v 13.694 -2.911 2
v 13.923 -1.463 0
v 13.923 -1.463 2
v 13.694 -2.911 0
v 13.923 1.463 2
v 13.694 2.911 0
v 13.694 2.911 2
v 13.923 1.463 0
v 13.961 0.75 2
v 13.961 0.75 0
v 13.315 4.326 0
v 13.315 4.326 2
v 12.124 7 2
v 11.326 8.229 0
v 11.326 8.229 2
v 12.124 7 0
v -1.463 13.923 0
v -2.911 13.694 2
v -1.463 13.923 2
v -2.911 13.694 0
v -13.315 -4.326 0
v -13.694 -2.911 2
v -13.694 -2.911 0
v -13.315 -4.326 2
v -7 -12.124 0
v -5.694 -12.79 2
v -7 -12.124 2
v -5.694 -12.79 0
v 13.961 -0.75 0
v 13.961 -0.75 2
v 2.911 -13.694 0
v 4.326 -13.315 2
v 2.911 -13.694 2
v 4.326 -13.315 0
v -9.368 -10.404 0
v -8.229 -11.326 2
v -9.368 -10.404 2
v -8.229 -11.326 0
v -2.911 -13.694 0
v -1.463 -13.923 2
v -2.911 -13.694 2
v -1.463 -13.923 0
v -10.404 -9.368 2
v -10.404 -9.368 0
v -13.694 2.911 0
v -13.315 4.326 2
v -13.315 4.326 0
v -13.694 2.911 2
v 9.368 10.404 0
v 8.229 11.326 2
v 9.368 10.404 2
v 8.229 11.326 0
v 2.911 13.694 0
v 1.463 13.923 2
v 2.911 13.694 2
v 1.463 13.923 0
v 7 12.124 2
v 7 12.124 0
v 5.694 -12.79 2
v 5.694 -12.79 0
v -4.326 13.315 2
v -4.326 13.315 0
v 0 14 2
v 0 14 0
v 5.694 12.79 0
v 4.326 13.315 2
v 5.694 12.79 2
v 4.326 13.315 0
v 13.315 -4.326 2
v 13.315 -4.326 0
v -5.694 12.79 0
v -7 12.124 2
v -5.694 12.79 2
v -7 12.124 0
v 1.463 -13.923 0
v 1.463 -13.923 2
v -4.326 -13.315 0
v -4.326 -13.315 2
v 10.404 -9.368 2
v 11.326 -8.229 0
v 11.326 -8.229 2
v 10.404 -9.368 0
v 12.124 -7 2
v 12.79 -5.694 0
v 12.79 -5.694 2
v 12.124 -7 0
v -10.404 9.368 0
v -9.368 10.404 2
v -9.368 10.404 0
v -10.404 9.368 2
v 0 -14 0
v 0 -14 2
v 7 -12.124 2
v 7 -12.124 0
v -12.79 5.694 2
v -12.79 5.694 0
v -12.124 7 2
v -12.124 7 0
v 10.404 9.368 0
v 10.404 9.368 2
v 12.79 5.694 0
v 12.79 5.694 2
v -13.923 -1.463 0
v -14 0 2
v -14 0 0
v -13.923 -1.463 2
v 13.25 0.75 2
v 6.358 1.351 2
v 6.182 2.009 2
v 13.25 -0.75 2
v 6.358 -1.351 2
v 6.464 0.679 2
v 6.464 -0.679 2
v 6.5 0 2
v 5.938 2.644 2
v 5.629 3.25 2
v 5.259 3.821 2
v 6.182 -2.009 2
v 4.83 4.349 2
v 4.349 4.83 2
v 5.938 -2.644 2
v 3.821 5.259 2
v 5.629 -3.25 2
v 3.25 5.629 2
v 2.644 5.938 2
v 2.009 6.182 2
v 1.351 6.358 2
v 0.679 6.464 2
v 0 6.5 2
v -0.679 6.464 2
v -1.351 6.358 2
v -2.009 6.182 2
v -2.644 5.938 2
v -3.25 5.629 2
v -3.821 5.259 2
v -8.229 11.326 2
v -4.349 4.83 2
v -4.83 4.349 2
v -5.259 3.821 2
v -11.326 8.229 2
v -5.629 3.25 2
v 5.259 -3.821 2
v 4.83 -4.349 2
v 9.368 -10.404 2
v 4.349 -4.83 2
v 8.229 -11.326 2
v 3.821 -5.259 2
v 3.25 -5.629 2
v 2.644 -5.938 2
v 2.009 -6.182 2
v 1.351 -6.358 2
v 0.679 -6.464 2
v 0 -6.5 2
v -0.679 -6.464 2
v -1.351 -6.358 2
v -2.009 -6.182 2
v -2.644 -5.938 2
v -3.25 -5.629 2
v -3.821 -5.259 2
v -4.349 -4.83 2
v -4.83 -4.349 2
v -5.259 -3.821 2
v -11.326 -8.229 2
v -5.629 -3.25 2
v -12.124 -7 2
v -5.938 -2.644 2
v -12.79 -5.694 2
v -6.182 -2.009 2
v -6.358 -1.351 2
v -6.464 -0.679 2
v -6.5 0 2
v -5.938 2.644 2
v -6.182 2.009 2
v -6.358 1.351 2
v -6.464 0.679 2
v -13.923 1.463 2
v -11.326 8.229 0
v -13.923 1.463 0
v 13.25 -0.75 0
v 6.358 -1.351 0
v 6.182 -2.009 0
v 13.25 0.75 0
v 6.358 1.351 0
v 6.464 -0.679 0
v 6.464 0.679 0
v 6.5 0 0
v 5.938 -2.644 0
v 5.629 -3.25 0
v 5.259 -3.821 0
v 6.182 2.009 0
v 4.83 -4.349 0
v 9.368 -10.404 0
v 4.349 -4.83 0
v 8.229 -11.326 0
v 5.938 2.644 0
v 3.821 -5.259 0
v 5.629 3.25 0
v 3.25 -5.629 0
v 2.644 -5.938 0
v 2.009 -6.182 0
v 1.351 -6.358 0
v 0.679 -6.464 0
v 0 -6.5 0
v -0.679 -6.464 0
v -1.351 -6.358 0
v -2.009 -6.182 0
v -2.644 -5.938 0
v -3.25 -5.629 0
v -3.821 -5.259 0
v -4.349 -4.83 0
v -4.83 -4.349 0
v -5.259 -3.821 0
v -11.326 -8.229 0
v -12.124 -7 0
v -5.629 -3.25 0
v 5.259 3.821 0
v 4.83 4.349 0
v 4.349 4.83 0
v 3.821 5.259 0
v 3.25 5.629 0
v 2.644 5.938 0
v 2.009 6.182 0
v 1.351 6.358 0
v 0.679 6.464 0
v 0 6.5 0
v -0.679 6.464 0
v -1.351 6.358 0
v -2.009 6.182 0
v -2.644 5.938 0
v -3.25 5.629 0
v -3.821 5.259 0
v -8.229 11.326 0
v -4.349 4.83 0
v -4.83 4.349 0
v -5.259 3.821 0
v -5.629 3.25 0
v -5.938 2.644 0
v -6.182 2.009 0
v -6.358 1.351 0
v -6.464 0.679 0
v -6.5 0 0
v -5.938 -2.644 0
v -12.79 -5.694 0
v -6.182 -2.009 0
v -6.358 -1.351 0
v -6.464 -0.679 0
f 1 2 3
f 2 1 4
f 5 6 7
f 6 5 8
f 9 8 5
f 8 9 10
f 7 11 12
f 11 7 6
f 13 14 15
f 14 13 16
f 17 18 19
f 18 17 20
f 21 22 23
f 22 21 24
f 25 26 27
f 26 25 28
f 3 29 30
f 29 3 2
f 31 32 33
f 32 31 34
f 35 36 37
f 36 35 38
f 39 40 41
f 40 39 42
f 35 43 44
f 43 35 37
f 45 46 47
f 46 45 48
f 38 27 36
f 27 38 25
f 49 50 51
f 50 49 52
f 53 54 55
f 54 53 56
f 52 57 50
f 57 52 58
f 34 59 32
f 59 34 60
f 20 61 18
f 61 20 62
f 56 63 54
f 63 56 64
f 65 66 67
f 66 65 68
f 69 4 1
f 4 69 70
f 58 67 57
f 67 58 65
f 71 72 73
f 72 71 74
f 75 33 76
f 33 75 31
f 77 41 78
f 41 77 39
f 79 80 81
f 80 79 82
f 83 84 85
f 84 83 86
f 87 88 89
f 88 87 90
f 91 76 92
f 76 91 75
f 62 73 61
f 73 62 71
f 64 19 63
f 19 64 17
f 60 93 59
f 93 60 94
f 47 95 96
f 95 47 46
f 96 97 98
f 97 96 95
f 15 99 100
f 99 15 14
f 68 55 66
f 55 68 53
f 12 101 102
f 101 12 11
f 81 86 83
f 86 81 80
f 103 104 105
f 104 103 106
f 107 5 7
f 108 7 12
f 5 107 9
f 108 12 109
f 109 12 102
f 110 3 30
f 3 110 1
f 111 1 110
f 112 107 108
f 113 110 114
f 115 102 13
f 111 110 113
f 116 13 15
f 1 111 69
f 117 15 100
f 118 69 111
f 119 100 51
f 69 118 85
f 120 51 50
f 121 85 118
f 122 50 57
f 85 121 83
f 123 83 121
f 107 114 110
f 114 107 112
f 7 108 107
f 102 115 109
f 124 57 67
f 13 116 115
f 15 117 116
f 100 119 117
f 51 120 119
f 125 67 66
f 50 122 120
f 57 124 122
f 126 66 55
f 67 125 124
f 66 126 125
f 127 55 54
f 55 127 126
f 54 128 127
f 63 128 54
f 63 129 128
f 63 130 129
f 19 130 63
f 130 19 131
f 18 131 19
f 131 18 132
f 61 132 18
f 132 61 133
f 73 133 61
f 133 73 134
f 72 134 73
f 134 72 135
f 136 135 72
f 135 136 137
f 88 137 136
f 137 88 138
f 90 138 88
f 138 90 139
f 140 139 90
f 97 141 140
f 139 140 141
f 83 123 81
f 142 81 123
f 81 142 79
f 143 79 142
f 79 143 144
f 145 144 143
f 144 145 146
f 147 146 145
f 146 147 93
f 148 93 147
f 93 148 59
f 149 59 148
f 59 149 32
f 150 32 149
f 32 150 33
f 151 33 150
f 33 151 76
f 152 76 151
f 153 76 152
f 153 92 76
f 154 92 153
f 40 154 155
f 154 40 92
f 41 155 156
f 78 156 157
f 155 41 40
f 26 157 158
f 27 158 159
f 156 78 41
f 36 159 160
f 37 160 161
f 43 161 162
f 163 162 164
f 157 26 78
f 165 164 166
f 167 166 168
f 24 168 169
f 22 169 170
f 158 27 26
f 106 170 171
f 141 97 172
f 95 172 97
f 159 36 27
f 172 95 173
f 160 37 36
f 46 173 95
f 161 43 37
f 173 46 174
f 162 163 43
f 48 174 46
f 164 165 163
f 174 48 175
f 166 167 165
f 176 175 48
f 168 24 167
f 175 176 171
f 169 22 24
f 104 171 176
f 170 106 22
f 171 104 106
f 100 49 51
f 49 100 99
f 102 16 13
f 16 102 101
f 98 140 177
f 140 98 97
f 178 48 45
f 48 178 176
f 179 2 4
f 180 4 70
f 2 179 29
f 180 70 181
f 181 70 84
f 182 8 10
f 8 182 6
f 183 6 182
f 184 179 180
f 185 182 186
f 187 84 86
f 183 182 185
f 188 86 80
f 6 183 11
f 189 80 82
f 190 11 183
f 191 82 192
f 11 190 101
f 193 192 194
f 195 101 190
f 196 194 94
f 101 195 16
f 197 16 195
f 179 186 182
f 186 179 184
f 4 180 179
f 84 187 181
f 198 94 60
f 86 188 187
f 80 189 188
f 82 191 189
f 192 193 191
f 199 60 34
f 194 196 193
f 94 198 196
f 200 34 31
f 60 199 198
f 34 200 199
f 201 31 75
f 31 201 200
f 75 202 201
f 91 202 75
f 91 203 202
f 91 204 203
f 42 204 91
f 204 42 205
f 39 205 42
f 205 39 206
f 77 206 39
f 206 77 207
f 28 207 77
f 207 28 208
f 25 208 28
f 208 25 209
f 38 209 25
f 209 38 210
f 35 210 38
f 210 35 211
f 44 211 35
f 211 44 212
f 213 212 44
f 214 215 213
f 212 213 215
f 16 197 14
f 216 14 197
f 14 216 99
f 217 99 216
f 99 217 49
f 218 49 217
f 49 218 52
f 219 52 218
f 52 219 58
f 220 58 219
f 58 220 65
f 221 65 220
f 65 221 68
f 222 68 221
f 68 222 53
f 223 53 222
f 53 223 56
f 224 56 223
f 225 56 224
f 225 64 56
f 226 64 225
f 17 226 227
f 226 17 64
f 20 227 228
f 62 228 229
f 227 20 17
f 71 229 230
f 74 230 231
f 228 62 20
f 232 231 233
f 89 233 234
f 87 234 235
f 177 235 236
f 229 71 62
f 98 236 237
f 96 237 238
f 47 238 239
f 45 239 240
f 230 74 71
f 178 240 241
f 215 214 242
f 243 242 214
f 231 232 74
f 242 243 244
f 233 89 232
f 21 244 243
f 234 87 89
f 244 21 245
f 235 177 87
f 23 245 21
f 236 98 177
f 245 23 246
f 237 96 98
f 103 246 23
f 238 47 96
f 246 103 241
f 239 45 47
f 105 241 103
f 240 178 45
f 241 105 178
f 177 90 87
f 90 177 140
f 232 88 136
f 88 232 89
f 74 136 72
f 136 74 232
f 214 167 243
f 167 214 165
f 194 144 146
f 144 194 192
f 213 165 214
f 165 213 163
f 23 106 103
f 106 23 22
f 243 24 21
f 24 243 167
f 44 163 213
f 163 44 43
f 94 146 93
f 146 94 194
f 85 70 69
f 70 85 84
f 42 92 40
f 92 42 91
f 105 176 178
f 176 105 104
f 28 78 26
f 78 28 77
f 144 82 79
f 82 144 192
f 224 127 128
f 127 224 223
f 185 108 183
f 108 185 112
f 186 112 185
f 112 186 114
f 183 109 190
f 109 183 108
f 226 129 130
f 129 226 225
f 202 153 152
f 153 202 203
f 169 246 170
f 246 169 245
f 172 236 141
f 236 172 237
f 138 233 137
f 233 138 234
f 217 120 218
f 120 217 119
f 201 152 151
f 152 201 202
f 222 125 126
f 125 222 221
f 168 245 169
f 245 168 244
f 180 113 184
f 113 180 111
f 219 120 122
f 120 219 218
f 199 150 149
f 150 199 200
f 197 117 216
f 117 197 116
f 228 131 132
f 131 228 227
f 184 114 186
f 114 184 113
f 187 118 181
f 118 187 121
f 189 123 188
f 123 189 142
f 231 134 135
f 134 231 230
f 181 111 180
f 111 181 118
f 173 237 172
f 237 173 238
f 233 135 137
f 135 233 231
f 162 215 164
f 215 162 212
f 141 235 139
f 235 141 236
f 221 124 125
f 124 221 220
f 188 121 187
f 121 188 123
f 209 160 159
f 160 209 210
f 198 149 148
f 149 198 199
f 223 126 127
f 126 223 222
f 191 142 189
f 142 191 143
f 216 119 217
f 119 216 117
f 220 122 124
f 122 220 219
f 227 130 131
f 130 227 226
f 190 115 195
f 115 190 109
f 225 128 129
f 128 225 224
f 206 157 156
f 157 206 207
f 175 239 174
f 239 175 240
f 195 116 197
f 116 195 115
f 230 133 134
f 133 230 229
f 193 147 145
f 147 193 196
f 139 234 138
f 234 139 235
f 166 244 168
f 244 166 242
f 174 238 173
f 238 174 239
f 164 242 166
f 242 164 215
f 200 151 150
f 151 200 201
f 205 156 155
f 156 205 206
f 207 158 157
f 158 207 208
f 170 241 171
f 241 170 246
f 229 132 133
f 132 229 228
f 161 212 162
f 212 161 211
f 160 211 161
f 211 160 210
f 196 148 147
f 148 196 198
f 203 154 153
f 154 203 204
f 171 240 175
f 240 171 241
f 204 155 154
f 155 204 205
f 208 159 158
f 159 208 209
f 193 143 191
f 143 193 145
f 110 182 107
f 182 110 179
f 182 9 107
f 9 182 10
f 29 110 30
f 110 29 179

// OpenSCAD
// Split lock washer.
$fn = 60;
eps = 0.02;
inner_d = 13;
outer_d = 28;
thickness = 2;
gap = 1.5;
difference() {
    cylinder(d=outer_d,h=thickness);
    translate([0,0,-eps]) cylinder(d=inner_d,h=thickness+2*eps);
    translate([outer_d/2-gap/2,-gap/2,-eps]) cube([gap+eps,gap,thickness+2*eps]);
}
